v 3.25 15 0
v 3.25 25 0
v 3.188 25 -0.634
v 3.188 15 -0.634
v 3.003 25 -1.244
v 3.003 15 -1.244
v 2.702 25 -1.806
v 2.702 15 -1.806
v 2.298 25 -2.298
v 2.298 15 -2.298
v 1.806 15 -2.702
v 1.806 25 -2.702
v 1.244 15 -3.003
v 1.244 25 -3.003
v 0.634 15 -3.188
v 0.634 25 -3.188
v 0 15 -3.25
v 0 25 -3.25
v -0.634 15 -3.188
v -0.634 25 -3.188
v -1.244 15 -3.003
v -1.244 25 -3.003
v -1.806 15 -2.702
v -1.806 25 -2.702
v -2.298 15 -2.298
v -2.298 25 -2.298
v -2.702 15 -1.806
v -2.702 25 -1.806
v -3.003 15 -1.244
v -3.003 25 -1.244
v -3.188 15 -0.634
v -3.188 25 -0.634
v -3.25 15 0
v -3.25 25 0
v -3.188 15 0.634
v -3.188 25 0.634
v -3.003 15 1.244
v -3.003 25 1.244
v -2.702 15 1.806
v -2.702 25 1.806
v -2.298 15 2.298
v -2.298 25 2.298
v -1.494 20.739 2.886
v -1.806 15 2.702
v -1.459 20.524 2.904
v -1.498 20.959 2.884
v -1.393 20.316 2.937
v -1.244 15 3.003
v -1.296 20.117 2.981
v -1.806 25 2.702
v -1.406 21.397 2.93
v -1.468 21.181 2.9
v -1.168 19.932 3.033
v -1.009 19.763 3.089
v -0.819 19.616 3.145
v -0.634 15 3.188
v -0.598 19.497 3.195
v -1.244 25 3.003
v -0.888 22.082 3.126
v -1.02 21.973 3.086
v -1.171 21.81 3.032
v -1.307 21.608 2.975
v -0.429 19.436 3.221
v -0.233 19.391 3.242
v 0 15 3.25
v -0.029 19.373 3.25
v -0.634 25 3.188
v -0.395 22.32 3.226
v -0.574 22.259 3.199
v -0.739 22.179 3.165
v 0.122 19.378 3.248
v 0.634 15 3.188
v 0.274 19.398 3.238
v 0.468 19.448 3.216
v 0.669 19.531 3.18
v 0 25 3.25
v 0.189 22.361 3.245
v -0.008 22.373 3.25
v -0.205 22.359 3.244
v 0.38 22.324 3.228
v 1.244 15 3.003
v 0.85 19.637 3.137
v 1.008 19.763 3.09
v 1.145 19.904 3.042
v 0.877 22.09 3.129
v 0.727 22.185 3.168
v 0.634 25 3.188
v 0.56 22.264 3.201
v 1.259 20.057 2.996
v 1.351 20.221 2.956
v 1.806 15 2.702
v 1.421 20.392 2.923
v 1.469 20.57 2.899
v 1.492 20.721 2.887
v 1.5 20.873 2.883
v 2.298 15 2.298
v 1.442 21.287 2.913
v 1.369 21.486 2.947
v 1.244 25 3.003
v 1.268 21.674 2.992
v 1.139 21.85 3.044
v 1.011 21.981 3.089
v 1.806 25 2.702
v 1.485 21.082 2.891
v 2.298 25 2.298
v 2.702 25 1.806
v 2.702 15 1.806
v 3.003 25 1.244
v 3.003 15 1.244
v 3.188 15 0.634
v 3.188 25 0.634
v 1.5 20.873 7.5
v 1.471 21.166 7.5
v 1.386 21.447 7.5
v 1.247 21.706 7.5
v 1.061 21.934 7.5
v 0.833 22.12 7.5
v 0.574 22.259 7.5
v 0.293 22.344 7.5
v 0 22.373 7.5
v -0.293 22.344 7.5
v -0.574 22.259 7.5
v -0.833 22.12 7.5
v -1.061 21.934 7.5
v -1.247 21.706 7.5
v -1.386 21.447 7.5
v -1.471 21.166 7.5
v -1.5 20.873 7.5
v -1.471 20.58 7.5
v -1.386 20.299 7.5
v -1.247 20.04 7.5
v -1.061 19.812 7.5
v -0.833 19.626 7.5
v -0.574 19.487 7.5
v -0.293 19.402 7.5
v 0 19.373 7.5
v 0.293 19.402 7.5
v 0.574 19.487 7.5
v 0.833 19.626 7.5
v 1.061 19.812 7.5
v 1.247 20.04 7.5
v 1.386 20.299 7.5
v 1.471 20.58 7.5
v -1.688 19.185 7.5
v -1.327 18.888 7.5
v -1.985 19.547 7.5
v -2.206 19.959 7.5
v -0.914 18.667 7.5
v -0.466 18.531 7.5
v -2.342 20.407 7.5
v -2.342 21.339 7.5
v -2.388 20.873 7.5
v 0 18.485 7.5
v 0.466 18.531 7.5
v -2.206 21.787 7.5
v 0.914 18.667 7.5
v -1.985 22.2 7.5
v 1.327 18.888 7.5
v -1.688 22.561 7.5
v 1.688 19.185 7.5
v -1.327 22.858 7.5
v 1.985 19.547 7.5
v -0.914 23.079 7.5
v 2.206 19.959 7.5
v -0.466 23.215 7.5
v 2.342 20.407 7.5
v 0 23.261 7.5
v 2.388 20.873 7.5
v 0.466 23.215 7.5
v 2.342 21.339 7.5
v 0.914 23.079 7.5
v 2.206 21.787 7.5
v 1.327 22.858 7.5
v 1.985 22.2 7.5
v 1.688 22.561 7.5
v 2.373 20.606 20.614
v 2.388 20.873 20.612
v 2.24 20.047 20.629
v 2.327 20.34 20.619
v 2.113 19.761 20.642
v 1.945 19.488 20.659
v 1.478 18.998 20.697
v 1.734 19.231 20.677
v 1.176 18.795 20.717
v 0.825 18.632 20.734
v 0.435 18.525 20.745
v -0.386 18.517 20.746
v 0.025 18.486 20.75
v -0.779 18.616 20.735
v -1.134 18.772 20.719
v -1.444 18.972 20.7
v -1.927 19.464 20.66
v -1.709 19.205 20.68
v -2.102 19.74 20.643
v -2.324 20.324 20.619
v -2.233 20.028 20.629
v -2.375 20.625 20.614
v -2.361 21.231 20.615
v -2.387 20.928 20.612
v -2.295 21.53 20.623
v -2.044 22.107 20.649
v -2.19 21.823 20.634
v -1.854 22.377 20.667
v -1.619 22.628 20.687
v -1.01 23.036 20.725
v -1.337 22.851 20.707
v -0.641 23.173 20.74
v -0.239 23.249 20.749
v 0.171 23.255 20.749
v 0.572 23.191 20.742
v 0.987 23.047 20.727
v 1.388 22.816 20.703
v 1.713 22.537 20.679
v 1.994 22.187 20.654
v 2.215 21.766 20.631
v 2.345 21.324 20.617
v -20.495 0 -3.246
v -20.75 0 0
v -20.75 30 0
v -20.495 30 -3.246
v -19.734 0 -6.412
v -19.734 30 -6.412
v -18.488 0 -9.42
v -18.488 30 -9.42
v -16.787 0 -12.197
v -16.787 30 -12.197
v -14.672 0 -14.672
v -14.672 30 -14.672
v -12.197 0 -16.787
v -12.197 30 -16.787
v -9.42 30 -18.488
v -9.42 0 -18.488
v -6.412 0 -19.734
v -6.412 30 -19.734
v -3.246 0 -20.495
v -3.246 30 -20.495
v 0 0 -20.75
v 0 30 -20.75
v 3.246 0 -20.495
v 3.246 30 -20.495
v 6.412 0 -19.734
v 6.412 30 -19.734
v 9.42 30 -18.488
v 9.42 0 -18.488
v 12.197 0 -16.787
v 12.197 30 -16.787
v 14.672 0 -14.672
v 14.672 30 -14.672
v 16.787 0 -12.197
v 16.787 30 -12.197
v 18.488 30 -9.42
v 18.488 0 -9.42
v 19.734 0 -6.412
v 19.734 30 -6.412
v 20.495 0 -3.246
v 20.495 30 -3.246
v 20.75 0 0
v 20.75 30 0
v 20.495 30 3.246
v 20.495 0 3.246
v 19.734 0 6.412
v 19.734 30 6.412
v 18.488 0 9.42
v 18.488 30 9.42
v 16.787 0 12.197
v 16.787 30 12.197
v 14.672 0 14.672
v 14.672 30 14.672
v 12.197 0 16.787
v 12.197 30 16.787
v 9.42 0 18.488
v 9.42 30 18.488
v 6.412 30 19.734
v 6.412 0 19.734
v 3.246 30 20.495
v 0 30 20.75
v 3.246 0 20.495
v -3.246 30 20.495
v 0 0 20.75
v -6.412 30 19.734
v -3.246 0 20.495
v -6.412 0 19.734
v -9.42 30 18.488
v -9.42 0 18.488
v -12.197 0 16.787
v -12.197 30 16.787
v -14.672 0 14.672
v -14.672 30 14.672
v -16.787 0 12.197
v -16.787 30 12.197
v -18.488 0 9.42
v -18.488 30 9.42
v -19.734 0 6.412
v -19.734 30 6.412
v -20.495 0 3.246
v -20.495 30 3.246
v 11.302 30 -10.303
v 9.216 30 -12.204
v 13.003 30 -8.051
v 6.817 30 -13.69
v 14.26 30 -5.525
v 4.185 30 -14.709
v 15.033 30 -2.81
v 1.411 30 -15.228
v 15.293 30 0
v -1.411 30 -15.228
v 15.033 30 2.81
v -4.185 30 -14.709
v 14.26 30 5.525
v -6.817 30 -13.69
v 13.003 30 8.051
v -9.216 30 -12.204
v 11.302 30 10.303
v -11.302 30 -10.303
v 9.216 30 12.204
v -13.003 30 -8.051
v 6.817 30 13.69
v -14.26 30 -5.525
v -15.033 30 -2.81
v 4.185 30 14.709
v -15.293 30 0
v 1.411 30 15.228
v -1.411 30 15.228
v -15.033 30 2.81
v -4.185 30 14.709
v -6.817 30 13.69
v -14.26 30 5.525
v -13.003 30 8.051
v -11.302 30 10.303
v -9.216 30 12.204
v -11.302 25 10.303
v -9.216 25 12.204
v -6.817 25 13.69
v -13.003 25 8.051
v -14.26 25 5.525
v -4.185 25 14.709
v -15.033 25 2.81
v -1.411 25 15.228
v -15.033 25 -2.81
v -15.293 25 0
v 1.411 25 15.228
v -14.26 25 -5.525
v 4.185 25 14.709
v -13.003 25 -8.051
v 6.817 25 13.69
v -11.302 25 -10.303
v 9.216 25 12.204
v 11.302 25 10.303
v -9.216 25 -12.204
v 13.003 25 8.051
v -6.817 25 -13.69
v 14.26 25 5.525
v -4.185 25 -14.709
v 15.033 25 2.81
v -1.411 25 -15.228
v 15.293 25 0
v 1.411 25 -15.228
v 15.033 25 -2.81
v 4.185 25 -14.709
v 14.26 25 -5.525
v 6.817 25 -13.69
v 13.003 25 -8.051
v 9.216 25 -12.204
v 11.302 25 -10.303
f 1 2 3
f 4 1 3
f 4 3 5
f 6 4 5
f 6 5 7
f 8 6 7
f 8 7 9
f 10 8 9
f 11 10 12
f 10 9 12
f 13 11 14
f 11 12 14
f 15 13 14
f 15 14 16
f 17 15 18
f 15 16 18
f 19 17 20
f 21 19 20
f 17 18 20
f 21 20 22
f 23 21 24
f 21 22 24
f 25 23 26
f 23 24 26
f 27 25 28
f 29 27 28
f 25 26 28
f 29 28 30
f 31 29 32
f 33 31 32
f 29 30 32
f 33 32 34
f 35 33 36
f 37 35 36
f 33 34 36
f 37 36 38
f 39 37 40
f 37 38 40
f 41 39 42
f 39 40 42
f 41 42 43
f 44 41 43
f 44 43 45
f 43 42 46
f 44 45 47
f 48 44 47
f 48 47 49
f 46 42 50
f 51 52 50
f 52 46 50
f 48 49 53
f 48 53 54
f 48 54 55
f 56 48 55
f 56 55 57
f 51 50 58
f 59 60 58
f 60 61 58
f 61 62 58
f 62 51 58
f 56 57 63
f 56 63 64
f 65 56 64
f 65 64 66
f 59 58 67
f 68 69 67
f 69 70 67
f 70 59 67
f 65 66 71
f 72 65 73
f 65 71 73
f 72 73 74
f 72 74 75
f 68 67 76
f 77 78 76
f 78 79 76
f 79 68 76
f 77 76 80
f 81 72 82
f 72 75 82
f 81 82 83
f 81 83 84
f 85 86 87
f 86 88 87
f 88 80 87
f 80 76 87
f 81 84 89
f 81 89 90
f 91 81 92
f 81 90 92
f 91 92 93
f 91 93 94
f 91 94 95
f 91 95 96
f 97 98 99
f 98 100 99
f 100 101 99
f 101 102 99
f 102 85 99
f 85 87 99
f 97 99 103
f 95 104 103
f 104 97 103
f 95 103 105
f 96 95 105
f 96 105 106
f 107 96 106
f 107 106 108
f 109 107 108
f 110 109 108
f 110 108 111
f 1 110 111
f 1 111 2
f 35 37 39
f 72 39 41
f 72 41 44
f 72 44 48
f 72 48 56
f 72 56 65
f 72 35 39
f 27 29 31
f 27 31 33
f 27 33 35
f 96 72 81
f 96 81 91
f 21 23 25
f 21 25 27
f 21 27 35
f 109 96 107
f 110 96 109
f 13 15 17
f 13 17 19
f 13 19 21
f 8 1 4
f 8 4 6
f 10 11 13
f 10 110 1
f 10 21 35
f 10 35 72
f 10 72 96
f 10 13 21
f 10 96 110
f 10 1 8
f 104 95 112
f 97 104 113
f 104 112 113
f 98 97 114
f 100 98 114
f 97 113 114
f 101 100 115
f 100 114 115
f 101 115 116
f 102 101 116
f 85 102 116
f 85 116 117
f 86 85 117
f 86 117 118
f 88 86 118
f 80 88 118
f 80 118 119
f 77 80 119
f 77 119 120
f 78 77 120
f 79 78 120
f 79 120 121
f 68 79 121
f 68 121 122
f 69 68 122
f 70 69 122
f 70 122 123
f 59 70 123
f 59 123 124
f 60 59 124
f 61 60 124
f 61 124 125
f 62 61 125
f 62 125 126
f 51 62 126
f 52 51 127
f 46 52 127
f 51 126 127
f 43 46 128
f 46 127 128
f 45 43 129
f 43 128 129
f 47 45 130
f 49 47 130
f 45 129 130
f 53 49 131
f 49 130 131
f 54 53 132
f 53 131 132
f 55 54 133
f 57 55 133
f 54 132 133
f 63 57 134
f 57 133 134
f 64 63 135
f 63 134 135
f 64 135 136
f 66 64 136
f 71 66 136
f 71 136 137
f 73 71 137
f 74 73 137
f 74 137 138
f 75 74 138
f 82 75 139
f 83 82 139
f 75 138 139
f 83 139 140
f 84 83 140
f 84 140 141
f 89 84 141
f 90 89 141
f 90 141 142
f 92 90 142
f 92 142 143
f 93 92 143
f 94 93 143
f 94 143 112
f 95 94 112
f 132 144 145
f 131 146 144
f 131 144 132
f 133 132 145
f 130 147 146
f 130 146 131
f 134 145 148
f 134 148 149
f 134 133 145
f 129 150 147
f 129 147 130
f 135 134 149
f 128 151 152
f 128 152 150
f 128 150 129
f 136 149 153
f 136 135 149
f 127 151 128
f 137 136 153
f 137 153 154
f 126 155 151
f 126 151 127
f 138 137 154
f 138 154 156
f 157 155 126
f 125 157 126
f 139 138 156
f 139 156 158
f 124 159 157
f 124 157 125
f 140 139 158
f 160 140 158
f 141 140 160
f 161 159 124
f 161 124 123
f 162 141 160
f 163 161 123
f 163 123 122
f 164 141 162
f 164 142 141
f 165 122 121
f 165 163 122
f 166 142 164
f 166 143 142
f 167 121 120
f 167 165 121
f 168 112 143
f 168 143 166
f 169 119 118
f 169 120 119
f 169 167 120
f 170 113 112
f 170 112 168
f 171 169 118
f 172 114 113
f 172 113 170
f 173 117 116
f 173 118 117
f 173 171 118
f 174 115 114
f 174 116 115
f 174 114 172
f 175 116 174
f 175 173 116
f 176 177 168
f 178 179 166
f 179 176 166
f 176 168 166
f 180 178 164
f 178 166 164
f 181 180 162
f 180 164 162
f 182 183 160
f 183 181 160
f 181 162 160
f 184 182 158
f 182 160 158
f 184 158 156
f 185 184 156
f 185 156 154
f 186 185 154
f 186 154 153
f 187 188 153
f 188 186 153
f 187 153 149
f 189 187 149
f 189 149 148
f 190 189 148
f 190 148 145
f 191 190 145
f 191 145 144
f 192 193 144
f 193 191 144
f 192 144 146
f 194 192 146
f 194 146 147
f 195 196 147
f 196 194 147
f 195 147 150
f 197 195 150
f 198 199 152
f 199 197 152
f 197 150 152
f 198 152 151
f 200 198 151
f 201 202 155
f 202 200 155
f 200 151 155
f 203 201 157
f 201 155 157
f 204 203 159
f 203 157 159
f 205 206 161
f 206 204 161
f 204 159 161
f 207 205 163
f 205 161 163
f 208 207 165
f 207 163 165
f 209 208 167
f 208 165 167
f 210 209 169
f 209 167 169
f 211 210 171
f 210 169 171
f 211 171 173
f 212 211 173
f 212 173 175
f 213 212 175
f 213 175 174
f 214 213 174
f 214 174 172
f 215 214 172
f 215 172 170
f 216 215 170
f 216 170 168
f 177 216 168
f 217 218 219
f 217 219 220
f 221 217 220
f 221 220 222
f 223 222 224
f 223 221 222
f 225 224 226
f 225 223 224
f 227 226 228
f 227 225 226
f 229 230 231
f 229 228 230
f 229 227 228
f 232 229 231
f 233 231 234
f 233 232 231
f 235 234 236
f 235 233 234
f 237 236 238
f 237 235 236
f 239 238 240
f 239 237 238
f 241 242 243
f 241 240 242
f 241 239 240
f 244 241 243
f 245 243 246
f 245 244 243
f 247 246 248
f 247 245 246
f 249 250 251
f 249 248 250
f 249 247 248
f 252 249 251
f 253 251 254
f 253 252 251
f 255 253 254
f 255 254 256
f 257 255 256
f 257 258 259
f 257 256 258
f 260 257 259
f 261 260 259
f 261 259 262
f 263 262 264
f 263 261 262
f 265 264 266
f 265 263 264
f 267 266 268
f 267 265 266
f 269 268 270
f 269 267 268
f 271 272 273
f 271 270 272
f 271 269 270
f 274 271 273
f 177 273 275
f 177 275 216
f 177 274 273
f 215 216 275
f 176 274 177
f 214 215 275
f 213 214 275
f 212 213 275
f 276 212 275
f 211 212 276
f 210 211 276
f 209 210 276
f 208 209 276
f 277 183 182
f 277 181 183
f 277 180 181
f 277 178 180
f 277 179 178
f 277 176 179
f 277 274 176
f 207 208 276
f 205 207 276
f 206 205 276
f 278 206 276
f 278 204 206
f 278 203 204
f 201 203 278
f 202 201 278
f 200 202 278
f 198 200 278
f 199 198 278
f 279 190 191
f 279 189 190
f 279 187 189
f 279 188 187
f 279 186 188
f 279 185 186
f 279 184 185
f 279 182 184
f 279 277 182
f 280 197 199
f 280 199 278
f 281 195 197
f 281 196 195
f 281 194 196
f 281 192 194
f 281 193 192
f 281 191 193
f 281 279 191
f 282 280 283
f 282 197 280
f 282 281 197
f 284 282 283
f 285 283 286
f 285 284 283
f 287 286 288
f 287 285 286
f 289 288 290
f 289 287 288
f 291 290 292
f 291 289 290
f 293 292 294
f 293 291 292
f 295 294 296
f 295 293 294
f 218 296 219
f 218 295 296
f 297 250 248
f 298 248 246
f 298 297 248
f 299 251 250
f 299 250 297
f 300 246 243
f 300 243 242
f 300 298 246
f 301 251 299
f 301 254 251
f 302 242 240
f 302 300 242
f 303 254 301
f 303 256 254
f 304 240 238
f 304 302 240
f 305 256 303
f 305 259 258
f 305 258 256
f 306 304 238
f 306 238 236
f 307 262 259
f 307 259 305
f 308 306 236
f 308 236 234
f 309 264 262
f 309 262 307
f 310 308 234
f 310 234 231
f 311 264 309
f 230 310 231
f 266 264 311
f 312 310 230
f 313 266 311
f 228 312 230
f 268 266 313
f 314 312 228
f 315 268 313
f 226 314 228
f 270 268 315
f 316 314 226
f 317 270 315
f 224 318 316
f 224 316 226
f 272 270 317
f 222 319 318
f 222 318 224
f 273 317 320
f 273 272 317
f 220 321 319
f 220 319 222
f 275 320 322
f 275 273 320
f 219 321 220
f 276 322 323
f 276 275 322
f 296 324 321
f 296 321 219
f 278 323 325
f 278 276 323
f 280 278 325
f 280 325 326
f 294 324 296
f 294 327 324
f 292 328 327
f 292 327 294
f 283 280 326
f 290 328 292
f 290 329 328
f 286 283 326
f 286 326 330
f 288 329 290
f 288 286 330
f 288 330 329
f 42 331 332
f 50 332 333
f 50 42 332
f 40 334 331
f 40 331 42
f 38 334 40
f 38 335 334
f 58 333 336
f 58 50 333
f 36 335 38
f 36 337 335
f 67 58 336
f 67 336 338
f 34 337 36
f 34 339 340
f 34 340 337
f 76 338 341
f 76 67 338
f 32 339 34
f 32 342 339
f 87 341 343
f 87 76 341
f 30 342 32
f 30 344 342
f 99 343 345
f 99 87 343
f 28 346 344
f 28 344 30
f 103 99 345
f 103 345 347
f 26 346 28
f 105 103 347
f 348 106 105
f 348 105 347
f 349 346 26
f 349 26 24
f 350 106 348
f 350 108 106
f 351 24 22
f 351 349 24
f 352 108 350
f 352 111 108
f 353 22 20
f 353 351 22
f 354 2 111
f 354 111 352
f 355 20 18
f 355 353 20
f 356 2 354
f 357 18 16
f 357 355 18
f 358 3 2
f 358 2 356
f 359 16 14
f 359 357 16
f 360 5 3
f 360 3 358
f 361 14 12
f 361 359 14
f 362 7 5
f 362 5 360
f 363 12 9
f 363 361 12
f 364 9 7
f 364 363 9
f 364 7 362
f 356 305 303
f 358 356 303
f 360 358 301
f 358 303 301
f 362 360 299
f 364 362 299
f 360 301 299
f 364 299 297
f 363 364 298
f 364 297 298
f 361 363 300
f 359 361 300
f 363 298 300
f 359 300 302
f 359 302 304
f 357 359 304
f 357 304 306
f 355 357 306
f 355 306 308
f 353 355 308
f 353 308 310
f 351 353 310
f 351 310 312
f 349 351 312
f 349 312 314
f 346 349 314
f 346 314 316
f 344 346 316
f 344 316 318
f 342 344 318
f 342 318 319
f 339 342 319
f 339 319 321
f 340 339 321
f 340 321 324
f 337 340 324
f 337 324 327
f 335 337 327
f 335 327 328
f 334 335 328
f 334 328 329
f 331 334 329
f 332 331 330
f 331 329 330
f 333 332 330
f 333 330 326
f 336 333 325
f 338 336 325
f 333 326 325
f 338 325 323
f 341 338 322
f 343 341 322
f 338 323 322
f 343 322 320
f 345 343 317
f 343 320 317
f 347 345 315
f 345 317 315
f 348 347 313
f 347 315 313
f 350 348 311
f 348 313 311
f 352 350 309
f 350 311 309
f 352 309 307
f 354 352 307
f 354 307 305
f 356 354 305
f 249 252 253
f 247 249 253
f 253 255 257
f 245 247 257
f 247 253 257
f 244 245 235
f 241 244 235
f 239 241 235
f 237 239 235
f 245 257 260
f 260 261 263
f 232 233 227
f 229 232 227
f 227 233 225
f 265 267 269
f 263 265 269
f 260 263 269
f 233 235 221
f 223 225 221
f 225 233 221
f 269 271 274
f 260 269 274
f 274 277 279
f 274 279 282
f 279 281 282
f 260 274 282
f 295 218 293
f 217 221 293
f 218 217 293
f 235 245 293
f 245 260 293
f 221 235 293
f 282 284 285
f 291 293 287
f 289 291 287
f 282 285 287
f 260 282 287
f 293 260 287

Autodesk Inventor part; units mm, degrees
ref_plane "YZ Plane" through (0, 0, 0) normal (1, 0, 0) x (0, 1, 0)
ref_plane "XZ Plane" through (0, 0, 0) normal (0, 1, 0) x (-1, 0, 0)
sketch "Sketch1" plane through (0, 0, 0) normal (0, 1, 0) x (-1, 0, 0)
  circle A0 centre (0, 0) radius 20.75
  dimension "d0" = 41.5
extrude "Extrusion1" add sketch "Sketch1" along normal blind 30
sketch "Sketch4" plane through (0, 30, 0) normal (0, 1, 0) x (1, 0, 0)
  circle A0 centre (0, 0) radius 3.25
  dimension "d8" = 6.5
extrude "Extrusion4" cut sketch "Sketch4" against normal blind 15
sketch "Sketch5" plane through (0, 30, 0) normal (0, 1, 0) x (1, 0, 0)
  circle A0 centre (0, 0) radius 15.2932
extrude "Extrusion5" cut sketch "Sketch5" against normal blind 5
ref_plane "Work Plane1" through (0, 0, 10) normal (0, 0, 1) x (1, 0, 0)
sketch "Sketch6" plane through (0, 0, 10) normal (0, 0, 1) x (1, 0, 0)
  circle A0 centre (0, 20.8731) radius 1.5
  point P0 (0, 0)
  dimension "d14" = 3
extrude "Extrusion6" cut sketch "Sketch6" along normal mid plane 25
ref_plane "Work Plane2" through (0, 0, 20) normal (0, 0, 1) x (1, 0, 0)
sketch "Sketch7" plane through (0, 0, 20) normal (0, 0, 1) x (1, 0, 0)
  circle A0 centre (0, 20.8731) radius 2.3877
  point P0 (0, 0)
  point P1 (1.5, 20.8731)
extrude "Extrusion7" cut sketch "Sketch7" along normal mid plane 25
properties part number "ban"
